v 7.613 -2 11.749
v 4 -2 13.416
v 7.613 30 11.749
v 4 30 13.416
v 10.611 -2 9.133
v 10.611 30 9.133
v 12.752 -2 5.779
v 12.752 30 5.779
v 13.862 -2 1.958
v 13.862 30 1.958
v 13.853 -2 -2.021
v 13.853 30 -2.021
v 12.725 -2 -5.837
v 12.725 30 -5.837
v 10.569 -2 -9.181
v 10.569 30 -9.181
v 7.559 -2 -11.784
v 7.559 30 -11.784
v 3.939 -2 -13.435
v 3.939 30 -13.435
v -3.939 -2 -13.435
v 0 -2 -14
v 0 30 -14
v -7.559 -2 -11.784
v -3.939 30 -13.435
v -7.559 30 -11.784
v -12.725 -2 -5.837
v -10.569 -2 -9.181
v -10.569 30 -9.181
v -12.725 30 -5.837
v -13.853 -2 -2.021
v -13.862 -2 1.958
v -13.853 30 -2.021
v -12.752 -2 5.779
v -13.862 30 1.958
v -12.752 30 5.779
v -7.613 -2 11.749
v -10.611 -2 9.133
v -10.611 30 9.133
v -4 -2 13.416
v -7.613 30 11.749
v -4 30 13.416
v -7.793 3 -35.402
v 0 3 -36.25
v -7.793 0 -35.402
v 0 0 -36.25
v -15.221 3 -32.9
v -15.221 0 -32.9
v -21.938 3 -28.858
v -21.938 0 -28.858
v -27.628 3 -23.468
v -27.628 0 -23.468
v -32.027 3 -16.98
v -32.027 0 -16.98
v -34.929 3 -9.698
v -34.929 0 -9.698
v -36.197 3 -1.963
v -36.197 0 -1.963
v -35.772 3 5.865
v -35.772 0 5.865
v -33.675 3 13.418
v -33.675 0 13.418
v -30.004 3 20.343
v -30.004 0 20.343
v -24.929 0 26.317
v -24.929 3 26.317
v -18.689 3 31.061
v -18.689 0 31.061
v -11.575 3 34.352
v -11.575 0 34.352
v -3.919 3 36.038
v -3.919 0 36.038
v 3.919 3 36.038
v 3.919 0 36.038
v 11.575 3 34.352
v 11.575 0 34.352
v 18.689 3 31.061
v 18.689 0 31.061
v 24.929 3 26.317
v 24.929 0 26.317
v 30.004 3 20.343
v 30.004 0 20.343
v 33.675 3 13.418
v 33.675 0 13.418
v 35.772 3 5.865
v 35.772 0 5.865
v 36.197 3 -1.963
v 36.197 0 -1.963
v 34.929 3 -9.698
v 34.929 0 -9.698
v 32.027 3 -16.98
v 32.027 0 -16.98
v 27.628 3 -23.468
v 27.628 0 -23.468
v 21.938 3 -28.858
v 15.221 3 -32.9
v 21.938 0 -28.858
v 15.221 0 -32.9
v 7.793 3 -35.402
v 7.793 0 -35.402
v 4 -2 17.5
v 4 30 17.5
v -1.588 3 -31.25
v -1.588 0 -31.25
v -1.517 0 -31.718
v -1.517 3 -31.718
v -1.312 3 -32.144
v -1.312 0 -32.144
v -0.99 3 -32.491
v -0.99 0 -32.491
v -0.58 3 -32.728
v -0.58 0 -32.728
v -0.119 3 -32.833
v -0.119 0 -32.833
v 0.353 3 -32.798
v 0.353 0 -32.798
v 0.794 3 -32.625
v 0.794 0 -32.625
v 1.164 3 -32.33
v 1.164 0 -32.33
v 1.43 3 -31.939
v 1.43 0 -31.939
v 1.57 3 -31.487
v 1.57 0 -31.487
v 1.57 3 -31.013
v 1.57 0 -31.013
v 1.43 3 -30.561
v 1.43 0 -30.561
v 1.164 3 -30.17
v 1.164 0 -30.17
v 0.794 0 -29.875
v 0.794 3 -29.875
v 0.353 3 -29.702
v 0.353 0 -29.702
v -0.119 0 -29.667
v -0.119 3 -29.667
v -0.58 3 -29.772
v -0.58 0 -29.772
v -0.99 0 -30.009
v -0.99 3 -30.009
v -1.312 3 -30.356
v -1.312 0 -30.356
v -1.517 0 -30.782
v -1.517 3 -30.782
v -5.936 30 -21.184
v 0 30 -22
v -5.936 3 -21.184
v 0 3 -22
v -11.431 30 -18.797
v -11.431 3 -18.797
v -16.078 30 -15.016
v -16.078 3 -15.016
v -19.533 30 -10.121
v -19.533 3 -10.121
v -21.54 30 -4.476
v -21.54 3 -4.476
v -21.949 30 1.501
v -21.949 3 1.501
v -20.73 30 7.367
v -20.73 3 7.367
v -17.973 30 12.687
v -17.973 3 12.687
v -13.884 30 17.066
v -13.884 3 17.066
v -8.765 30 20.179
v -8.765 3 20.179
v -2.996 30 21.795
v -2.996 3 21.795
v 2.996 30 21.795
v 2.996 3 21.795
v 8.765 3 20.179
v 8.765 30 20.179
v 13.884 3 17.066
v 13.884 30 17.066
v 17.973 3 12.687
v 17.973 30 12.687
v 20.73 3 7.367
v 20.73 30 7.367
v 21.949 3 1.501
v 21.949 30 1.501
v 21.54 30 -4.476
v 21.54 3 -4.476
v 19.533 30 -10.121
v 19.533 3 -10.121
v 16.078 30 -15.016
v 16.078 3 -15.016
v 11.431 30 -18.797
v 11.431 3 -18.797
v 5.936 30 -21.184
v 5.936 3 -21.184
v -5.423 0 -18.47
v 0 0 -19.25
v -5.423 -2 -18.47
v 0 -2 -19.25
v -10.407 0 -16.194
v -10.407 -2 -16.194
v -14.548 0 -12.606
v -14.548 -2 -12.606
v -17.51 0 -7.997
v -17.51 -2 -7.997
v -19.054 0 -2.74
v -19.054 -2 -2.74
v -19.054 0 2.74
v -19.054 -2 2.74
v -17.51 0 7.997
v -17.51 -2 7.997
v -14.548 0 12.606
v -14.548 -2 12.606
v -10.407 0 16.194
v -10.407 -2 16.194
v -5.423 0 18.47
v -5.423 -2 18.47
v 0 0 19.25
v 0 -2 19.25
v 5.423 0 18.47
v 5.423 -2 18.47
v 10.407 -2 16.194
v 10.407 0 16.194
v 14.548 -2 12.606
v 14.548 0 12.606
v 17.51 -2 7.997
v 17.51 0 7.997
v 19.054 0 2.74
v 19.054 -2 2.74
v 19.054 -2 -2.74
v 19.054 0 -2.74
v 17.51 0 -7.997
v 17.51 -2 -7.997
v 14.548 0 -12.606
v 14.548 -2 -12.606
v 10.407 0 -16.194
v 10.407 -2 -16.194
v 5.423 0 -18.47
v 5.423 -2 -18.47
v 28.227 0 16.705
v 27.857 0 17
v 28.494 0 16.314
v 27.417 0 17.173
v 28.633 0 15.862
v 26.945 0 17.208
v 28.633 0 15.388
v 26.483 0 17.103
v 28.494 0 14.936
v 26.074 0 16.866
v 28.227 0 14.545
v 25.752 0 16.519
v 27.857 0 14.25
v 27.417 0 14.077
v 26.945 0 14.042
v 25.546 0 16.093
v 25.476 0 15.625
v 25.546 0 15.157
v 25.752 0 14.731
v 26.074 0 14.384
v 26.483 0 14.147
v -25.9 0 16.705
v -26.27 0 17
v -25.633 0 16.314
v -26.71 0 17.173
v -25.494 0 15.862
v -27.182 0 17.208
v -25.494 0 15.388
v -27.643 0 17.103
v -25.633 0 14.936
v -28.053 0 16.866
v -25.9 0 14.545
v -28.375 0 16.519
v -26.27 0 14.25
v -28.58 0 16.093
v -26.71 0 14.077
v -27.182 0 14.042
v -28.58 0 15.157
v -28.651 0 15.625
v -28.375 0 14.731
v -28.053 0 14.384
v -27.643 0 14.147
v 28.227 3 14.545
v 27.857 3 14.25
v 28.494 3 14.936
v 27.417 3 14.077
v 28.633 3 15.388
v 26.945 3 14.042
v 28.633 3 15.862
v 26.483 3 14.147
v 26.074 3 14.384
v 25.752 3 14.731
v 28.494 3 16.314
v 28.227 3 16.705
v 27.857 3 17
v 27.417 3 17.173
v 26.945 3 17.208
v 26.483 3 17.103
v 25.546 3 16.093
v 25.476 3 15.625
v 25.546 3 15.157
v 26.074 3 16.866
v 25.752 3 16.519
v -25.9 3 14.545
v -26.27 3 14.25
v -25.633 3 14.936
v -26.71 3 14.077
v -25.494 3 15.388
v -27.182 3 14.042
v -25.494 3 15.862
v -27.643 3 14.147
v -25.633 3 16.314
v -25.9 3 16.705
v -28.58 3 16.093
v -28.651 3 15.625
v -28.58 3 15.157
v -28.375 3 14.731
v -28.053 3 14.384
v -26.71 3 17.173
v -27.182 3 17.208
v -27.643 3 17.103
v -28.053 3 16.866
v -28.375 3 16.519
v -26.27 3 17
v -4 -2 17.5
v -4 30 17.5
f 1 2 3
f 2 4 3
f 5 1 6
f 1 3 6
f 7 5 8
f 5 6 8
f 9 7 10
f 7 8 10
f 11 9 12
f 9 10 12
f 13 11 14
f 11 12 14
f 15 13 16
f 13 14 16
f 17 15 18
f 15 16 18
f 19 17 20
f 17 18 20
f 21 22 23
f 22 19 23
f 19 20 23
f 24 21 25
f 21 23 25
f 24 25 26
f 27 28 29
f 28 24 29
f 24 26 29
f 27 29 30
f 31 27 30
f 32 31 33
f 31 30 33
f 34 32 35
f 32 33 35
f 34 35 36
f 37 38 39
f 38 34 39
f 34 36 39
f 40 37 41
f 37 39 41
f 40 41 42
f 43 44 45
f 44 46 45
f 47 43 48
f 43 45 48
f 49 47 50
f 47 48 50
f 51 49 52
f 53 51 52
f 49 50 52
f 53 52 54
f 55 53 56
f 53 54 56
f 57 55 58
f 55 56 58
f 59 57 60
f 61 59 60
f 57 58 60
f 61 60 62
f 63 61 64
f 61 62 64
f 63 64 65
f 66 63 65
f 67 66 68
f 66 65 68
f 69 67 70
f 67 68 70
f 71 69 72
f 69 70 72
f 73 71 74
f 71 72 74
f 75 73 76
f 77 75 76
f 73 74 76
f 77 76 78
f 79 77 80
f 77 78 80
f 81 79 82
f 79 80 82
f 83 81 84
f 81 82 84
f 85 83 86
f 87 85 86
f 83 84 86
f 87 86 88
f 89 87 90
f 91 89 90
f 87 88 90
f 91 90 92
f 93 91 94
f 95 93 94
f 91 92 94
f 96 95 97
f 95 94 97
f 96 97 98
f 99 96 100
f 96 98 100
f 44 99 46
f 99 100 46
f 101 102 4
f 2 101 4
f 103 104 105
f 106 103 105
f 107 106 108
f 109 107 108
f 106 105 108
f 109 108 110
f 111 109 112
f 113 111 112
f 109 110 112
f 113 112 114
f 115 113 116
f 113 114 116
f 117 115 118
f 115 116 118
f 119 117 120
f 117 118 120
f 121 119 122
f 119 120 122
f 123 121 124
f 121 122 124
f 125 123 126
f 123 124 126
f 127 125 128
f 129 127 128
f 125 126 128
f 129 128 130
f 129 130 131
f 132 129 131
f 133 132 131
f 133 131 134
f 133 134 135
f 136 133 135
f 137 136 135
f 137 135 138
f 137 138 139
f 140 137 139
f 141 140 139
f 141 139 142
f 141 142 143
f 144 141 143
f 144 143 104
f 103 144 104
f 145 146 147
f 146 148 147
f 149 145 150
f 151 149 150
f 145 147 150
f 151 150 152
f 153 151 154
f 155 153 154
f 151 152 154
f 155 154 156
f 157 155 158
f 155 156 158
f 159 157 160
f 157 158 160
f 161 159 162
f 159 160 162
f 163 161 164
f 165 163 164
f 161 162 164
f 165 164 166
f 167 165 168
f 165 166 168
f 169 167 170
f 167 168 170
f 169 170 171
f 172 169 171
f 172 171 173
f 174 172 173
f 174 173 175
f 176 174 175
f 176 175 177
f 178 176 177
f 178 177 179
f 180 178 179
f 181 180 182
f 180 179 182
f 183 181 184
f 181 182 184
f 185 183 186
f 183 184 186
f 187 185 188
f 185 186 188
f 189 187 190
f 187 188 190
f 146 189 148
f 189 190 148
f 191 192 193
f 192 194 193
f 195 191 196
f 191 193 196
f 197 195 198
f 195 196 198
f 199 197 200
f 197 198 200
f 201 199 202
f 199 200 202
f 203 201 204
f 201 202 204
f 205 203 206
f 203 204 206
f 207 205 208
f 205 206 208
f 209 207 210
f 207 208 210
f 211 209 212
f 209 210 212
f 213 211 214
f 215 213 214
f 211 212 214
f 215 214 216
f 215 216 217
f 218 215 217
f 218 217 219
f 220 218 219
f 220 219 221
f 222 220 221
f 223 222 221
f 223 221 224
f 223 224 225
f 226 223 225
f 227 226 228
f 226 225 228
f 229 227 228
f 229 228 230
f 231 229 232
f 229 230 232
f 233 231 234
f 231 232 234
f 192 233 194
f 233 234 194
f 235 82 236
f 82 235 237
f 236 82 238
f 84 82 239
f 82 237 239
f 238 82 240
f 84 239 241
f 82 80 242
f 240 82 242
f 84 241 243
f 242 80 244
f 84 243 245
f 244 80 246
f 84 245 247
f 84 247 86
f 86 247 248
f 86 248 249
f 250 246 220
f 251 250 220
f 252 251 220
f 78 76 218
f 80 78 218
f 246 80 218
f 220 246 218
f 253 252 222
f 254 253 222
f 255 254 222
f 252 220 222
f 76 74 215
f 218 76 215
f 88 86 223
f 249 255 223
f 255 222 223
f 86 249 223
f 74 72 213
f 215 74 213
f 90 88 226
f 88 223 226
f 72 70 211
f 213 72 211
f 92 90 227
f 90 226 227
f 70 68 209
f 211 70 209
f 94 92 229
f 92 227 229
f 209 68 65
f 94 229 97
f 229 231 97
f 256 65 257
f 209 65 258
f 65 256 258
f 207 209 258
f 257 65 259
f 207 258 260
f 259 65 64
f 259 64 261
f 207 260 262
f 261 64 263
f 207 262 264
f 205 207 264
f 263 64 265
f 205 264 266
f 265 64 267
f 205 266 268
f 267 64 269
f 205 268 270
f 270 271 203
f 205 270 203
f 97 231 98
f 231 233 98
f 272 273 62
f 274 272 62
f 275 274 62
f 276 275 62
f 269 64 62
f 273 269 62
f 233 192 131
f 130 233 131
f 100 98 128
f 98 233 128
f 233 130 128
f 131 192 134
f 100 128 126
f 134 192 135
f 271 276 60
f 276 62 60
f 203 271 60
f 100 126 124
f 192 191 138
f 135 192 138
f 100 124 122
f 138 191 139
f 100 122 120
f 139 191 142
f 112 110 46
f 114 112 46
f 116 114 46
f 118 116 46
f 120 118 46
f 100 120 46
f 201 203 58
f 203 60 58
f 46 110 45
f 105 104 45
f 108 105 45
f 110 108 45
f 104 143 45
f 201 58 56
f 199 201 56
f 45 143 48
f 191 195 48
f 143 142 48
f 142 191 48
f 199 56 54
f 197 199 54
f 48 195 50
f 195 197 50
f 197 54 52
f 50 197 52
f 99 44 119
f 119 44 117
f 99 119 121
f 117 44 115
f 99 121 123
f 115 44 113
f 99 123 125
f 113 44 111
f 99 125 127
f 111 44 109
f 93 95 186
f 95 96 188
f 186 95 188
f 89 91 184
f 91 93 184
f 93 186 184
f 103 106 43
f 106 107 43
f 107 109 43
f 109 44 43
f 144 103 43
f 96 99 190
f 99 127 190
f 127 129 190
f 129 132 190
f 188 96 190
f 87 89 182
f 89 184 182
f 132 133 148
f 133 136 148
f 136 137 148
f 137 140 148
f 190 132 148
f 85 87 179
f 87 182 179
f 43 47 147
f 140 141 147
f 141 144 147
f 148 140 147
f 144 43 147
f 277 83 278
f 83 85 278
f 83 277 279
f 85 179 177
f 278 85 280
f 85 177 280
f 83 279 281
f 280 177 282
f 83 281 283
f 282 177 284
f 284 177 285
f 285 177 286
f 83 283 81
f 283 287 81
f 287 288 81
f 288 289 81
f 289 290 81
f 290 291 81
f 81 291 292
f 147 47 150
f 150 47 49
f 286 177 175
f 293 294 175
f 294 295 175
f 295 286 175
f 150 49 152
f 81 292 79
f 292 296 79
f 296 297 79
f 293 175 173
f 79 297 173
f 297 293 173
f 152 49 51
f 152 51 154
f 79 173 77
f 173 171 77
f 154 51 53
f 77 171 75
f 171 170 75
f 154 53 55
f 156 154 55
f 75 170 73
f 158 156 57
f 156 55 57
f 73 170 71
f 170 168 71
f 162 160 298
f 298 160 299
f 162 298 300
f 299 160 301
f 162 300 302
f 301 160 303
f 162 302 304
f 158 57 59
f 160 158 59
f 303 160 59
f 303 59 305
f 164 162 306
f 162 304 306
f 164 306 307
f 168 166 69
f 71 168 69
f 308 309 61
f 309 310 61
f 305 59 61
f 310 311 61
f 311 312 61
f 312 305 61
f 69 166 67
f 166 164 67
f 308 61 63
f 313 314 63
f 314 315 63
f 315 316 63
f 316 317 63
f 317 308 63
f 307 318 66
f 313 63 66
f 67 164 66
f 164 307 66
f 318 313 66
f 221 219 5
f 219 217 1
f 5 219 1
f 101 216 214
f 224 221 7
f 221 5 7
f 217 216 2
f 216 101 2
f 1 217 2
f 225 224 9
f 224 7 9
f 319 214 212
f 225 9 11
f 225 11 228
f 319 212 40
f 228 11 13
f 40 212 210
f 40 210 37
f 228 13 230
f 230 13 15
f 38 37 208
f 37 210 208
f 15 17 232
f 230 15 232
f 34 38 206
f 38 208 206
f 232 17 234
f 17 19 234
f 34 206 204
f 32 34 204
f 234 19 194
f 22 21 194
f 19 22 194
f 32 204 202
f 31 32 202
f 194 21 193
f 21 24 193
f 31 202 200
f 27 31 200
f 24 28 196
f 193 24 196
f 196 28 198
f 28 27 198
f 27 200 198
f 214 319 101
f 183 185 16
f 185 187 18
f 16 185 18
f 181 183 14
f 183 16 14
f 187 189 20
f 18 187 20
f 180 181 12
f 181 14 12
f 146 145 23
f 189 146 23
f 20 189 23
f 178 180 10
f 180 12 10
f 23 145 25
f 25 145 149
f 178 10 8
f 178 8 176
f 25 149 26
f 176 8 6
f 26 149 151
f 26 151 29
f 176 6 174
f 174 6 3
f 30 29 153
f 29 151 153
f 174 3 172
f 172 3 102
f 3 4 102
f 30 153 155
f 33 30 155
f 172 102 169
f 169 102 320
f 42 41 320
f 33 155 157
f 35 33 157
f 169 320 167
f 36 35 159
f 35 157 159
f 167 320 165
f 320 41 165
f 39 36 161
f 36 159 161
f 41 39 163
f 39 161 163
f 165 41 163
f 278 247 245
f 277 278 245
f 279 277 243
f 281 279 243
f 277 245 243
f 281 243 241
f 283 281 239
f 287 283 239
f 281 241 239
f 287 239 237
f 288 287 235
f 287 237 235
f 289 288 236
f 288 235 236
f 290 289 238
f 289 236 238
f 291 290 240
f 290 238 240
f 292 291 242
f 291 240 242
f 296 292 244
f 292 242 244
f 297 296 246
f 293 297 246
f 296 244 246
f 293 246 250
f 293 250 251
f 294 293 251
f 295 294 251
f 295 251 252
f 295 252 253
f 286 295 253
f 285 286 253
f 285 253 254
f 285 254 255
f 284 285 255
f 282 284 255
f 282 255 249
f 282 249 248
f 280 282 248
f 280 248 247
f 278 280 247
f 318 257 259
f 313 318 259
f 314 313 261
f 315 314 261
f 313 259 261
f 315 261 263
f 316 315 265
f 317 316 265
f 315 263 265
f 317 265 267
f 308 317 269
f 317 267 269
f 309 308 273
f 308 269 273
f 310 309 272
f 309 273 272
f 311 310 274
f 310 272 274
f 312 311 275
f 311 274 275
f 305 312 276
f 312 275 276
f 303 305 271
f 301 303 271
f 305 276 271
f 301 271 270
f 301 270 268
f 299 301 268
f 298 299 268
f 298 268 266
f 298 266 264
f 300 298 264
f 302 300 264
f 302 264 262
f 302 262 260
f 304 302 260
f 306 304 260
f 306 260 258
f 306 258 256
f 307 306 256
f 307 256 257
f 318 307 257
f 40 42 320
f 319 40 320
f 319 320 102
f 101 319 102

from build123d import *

# Parameters (mm, degrees)
F_1_8_0_125_DIAMETER_HOLE1_D = 3.175
CIRPATTERN1_COUNT            = 3
CUT_EXTRUDE2_DEPTH           = 61.432813934


with BuildPart() as part:
    # Sketch1 → Revolve1 (revolve)
    with BuildSketch(Plane.XY, mode=Mode.PRIVATE) as revolve1_sk:
        Polygon((22, 30), (22, 3), (36.25, 3), (36.25, 0), (19.25, 0), (19.25, -2), (14, -2), (14, 30), align=None)
    revolve(revolve1_sk.sketch.rotate(Axis((0, 0, 0), (0, 1, 0)), 90), axis=Axis((0, 0, 0), (0, 1, 0)))

    # 1/8 (0.125) Diameter Hole1 (through all)
    with Locations(Plane(origin=(0, 3, 0), x_dir=(1, 0, 0), z_dir=(0, 1, 0))):
        with Locations((0, 31.25)):
            f_1_8_0_125_diameter_hole1 = Hole(F_1_8_0_125_DIAMETER_HOLE1_D / 2)

    # CirPattern1: 1/8 (0.125) Diameter Hole1 ×3 about axis
    cirpattern1_axis = Axis((0, 0, 0), (0, 1, 0))
    for i in range(1, CIRPATTERN1_COUNT):
        add(f_1_8_0_125_diameter_hole1.rotate(cirpattern1_axis, i * 360 / CIRPATTERN1_COUNT), mode=Mode.SUBTRACT)

    # Sketch7 → Cut-Extrude2 (cut, through all)
    with BuildSketch(Plane(origin=(0, 30, 0), x_dir=(1, 0, 0), z_dir=(0, 1, 0))):
        Polygon((0, -17.5), (4, -17.5), (4, -12.919453698), (-4, -12.919453698), (-4, -17.5), align=None)
    extrude(amount=-CUT_EXTRUDE2_DEPTH, mode=Mode.SUBTRACT)


solid = part.part
